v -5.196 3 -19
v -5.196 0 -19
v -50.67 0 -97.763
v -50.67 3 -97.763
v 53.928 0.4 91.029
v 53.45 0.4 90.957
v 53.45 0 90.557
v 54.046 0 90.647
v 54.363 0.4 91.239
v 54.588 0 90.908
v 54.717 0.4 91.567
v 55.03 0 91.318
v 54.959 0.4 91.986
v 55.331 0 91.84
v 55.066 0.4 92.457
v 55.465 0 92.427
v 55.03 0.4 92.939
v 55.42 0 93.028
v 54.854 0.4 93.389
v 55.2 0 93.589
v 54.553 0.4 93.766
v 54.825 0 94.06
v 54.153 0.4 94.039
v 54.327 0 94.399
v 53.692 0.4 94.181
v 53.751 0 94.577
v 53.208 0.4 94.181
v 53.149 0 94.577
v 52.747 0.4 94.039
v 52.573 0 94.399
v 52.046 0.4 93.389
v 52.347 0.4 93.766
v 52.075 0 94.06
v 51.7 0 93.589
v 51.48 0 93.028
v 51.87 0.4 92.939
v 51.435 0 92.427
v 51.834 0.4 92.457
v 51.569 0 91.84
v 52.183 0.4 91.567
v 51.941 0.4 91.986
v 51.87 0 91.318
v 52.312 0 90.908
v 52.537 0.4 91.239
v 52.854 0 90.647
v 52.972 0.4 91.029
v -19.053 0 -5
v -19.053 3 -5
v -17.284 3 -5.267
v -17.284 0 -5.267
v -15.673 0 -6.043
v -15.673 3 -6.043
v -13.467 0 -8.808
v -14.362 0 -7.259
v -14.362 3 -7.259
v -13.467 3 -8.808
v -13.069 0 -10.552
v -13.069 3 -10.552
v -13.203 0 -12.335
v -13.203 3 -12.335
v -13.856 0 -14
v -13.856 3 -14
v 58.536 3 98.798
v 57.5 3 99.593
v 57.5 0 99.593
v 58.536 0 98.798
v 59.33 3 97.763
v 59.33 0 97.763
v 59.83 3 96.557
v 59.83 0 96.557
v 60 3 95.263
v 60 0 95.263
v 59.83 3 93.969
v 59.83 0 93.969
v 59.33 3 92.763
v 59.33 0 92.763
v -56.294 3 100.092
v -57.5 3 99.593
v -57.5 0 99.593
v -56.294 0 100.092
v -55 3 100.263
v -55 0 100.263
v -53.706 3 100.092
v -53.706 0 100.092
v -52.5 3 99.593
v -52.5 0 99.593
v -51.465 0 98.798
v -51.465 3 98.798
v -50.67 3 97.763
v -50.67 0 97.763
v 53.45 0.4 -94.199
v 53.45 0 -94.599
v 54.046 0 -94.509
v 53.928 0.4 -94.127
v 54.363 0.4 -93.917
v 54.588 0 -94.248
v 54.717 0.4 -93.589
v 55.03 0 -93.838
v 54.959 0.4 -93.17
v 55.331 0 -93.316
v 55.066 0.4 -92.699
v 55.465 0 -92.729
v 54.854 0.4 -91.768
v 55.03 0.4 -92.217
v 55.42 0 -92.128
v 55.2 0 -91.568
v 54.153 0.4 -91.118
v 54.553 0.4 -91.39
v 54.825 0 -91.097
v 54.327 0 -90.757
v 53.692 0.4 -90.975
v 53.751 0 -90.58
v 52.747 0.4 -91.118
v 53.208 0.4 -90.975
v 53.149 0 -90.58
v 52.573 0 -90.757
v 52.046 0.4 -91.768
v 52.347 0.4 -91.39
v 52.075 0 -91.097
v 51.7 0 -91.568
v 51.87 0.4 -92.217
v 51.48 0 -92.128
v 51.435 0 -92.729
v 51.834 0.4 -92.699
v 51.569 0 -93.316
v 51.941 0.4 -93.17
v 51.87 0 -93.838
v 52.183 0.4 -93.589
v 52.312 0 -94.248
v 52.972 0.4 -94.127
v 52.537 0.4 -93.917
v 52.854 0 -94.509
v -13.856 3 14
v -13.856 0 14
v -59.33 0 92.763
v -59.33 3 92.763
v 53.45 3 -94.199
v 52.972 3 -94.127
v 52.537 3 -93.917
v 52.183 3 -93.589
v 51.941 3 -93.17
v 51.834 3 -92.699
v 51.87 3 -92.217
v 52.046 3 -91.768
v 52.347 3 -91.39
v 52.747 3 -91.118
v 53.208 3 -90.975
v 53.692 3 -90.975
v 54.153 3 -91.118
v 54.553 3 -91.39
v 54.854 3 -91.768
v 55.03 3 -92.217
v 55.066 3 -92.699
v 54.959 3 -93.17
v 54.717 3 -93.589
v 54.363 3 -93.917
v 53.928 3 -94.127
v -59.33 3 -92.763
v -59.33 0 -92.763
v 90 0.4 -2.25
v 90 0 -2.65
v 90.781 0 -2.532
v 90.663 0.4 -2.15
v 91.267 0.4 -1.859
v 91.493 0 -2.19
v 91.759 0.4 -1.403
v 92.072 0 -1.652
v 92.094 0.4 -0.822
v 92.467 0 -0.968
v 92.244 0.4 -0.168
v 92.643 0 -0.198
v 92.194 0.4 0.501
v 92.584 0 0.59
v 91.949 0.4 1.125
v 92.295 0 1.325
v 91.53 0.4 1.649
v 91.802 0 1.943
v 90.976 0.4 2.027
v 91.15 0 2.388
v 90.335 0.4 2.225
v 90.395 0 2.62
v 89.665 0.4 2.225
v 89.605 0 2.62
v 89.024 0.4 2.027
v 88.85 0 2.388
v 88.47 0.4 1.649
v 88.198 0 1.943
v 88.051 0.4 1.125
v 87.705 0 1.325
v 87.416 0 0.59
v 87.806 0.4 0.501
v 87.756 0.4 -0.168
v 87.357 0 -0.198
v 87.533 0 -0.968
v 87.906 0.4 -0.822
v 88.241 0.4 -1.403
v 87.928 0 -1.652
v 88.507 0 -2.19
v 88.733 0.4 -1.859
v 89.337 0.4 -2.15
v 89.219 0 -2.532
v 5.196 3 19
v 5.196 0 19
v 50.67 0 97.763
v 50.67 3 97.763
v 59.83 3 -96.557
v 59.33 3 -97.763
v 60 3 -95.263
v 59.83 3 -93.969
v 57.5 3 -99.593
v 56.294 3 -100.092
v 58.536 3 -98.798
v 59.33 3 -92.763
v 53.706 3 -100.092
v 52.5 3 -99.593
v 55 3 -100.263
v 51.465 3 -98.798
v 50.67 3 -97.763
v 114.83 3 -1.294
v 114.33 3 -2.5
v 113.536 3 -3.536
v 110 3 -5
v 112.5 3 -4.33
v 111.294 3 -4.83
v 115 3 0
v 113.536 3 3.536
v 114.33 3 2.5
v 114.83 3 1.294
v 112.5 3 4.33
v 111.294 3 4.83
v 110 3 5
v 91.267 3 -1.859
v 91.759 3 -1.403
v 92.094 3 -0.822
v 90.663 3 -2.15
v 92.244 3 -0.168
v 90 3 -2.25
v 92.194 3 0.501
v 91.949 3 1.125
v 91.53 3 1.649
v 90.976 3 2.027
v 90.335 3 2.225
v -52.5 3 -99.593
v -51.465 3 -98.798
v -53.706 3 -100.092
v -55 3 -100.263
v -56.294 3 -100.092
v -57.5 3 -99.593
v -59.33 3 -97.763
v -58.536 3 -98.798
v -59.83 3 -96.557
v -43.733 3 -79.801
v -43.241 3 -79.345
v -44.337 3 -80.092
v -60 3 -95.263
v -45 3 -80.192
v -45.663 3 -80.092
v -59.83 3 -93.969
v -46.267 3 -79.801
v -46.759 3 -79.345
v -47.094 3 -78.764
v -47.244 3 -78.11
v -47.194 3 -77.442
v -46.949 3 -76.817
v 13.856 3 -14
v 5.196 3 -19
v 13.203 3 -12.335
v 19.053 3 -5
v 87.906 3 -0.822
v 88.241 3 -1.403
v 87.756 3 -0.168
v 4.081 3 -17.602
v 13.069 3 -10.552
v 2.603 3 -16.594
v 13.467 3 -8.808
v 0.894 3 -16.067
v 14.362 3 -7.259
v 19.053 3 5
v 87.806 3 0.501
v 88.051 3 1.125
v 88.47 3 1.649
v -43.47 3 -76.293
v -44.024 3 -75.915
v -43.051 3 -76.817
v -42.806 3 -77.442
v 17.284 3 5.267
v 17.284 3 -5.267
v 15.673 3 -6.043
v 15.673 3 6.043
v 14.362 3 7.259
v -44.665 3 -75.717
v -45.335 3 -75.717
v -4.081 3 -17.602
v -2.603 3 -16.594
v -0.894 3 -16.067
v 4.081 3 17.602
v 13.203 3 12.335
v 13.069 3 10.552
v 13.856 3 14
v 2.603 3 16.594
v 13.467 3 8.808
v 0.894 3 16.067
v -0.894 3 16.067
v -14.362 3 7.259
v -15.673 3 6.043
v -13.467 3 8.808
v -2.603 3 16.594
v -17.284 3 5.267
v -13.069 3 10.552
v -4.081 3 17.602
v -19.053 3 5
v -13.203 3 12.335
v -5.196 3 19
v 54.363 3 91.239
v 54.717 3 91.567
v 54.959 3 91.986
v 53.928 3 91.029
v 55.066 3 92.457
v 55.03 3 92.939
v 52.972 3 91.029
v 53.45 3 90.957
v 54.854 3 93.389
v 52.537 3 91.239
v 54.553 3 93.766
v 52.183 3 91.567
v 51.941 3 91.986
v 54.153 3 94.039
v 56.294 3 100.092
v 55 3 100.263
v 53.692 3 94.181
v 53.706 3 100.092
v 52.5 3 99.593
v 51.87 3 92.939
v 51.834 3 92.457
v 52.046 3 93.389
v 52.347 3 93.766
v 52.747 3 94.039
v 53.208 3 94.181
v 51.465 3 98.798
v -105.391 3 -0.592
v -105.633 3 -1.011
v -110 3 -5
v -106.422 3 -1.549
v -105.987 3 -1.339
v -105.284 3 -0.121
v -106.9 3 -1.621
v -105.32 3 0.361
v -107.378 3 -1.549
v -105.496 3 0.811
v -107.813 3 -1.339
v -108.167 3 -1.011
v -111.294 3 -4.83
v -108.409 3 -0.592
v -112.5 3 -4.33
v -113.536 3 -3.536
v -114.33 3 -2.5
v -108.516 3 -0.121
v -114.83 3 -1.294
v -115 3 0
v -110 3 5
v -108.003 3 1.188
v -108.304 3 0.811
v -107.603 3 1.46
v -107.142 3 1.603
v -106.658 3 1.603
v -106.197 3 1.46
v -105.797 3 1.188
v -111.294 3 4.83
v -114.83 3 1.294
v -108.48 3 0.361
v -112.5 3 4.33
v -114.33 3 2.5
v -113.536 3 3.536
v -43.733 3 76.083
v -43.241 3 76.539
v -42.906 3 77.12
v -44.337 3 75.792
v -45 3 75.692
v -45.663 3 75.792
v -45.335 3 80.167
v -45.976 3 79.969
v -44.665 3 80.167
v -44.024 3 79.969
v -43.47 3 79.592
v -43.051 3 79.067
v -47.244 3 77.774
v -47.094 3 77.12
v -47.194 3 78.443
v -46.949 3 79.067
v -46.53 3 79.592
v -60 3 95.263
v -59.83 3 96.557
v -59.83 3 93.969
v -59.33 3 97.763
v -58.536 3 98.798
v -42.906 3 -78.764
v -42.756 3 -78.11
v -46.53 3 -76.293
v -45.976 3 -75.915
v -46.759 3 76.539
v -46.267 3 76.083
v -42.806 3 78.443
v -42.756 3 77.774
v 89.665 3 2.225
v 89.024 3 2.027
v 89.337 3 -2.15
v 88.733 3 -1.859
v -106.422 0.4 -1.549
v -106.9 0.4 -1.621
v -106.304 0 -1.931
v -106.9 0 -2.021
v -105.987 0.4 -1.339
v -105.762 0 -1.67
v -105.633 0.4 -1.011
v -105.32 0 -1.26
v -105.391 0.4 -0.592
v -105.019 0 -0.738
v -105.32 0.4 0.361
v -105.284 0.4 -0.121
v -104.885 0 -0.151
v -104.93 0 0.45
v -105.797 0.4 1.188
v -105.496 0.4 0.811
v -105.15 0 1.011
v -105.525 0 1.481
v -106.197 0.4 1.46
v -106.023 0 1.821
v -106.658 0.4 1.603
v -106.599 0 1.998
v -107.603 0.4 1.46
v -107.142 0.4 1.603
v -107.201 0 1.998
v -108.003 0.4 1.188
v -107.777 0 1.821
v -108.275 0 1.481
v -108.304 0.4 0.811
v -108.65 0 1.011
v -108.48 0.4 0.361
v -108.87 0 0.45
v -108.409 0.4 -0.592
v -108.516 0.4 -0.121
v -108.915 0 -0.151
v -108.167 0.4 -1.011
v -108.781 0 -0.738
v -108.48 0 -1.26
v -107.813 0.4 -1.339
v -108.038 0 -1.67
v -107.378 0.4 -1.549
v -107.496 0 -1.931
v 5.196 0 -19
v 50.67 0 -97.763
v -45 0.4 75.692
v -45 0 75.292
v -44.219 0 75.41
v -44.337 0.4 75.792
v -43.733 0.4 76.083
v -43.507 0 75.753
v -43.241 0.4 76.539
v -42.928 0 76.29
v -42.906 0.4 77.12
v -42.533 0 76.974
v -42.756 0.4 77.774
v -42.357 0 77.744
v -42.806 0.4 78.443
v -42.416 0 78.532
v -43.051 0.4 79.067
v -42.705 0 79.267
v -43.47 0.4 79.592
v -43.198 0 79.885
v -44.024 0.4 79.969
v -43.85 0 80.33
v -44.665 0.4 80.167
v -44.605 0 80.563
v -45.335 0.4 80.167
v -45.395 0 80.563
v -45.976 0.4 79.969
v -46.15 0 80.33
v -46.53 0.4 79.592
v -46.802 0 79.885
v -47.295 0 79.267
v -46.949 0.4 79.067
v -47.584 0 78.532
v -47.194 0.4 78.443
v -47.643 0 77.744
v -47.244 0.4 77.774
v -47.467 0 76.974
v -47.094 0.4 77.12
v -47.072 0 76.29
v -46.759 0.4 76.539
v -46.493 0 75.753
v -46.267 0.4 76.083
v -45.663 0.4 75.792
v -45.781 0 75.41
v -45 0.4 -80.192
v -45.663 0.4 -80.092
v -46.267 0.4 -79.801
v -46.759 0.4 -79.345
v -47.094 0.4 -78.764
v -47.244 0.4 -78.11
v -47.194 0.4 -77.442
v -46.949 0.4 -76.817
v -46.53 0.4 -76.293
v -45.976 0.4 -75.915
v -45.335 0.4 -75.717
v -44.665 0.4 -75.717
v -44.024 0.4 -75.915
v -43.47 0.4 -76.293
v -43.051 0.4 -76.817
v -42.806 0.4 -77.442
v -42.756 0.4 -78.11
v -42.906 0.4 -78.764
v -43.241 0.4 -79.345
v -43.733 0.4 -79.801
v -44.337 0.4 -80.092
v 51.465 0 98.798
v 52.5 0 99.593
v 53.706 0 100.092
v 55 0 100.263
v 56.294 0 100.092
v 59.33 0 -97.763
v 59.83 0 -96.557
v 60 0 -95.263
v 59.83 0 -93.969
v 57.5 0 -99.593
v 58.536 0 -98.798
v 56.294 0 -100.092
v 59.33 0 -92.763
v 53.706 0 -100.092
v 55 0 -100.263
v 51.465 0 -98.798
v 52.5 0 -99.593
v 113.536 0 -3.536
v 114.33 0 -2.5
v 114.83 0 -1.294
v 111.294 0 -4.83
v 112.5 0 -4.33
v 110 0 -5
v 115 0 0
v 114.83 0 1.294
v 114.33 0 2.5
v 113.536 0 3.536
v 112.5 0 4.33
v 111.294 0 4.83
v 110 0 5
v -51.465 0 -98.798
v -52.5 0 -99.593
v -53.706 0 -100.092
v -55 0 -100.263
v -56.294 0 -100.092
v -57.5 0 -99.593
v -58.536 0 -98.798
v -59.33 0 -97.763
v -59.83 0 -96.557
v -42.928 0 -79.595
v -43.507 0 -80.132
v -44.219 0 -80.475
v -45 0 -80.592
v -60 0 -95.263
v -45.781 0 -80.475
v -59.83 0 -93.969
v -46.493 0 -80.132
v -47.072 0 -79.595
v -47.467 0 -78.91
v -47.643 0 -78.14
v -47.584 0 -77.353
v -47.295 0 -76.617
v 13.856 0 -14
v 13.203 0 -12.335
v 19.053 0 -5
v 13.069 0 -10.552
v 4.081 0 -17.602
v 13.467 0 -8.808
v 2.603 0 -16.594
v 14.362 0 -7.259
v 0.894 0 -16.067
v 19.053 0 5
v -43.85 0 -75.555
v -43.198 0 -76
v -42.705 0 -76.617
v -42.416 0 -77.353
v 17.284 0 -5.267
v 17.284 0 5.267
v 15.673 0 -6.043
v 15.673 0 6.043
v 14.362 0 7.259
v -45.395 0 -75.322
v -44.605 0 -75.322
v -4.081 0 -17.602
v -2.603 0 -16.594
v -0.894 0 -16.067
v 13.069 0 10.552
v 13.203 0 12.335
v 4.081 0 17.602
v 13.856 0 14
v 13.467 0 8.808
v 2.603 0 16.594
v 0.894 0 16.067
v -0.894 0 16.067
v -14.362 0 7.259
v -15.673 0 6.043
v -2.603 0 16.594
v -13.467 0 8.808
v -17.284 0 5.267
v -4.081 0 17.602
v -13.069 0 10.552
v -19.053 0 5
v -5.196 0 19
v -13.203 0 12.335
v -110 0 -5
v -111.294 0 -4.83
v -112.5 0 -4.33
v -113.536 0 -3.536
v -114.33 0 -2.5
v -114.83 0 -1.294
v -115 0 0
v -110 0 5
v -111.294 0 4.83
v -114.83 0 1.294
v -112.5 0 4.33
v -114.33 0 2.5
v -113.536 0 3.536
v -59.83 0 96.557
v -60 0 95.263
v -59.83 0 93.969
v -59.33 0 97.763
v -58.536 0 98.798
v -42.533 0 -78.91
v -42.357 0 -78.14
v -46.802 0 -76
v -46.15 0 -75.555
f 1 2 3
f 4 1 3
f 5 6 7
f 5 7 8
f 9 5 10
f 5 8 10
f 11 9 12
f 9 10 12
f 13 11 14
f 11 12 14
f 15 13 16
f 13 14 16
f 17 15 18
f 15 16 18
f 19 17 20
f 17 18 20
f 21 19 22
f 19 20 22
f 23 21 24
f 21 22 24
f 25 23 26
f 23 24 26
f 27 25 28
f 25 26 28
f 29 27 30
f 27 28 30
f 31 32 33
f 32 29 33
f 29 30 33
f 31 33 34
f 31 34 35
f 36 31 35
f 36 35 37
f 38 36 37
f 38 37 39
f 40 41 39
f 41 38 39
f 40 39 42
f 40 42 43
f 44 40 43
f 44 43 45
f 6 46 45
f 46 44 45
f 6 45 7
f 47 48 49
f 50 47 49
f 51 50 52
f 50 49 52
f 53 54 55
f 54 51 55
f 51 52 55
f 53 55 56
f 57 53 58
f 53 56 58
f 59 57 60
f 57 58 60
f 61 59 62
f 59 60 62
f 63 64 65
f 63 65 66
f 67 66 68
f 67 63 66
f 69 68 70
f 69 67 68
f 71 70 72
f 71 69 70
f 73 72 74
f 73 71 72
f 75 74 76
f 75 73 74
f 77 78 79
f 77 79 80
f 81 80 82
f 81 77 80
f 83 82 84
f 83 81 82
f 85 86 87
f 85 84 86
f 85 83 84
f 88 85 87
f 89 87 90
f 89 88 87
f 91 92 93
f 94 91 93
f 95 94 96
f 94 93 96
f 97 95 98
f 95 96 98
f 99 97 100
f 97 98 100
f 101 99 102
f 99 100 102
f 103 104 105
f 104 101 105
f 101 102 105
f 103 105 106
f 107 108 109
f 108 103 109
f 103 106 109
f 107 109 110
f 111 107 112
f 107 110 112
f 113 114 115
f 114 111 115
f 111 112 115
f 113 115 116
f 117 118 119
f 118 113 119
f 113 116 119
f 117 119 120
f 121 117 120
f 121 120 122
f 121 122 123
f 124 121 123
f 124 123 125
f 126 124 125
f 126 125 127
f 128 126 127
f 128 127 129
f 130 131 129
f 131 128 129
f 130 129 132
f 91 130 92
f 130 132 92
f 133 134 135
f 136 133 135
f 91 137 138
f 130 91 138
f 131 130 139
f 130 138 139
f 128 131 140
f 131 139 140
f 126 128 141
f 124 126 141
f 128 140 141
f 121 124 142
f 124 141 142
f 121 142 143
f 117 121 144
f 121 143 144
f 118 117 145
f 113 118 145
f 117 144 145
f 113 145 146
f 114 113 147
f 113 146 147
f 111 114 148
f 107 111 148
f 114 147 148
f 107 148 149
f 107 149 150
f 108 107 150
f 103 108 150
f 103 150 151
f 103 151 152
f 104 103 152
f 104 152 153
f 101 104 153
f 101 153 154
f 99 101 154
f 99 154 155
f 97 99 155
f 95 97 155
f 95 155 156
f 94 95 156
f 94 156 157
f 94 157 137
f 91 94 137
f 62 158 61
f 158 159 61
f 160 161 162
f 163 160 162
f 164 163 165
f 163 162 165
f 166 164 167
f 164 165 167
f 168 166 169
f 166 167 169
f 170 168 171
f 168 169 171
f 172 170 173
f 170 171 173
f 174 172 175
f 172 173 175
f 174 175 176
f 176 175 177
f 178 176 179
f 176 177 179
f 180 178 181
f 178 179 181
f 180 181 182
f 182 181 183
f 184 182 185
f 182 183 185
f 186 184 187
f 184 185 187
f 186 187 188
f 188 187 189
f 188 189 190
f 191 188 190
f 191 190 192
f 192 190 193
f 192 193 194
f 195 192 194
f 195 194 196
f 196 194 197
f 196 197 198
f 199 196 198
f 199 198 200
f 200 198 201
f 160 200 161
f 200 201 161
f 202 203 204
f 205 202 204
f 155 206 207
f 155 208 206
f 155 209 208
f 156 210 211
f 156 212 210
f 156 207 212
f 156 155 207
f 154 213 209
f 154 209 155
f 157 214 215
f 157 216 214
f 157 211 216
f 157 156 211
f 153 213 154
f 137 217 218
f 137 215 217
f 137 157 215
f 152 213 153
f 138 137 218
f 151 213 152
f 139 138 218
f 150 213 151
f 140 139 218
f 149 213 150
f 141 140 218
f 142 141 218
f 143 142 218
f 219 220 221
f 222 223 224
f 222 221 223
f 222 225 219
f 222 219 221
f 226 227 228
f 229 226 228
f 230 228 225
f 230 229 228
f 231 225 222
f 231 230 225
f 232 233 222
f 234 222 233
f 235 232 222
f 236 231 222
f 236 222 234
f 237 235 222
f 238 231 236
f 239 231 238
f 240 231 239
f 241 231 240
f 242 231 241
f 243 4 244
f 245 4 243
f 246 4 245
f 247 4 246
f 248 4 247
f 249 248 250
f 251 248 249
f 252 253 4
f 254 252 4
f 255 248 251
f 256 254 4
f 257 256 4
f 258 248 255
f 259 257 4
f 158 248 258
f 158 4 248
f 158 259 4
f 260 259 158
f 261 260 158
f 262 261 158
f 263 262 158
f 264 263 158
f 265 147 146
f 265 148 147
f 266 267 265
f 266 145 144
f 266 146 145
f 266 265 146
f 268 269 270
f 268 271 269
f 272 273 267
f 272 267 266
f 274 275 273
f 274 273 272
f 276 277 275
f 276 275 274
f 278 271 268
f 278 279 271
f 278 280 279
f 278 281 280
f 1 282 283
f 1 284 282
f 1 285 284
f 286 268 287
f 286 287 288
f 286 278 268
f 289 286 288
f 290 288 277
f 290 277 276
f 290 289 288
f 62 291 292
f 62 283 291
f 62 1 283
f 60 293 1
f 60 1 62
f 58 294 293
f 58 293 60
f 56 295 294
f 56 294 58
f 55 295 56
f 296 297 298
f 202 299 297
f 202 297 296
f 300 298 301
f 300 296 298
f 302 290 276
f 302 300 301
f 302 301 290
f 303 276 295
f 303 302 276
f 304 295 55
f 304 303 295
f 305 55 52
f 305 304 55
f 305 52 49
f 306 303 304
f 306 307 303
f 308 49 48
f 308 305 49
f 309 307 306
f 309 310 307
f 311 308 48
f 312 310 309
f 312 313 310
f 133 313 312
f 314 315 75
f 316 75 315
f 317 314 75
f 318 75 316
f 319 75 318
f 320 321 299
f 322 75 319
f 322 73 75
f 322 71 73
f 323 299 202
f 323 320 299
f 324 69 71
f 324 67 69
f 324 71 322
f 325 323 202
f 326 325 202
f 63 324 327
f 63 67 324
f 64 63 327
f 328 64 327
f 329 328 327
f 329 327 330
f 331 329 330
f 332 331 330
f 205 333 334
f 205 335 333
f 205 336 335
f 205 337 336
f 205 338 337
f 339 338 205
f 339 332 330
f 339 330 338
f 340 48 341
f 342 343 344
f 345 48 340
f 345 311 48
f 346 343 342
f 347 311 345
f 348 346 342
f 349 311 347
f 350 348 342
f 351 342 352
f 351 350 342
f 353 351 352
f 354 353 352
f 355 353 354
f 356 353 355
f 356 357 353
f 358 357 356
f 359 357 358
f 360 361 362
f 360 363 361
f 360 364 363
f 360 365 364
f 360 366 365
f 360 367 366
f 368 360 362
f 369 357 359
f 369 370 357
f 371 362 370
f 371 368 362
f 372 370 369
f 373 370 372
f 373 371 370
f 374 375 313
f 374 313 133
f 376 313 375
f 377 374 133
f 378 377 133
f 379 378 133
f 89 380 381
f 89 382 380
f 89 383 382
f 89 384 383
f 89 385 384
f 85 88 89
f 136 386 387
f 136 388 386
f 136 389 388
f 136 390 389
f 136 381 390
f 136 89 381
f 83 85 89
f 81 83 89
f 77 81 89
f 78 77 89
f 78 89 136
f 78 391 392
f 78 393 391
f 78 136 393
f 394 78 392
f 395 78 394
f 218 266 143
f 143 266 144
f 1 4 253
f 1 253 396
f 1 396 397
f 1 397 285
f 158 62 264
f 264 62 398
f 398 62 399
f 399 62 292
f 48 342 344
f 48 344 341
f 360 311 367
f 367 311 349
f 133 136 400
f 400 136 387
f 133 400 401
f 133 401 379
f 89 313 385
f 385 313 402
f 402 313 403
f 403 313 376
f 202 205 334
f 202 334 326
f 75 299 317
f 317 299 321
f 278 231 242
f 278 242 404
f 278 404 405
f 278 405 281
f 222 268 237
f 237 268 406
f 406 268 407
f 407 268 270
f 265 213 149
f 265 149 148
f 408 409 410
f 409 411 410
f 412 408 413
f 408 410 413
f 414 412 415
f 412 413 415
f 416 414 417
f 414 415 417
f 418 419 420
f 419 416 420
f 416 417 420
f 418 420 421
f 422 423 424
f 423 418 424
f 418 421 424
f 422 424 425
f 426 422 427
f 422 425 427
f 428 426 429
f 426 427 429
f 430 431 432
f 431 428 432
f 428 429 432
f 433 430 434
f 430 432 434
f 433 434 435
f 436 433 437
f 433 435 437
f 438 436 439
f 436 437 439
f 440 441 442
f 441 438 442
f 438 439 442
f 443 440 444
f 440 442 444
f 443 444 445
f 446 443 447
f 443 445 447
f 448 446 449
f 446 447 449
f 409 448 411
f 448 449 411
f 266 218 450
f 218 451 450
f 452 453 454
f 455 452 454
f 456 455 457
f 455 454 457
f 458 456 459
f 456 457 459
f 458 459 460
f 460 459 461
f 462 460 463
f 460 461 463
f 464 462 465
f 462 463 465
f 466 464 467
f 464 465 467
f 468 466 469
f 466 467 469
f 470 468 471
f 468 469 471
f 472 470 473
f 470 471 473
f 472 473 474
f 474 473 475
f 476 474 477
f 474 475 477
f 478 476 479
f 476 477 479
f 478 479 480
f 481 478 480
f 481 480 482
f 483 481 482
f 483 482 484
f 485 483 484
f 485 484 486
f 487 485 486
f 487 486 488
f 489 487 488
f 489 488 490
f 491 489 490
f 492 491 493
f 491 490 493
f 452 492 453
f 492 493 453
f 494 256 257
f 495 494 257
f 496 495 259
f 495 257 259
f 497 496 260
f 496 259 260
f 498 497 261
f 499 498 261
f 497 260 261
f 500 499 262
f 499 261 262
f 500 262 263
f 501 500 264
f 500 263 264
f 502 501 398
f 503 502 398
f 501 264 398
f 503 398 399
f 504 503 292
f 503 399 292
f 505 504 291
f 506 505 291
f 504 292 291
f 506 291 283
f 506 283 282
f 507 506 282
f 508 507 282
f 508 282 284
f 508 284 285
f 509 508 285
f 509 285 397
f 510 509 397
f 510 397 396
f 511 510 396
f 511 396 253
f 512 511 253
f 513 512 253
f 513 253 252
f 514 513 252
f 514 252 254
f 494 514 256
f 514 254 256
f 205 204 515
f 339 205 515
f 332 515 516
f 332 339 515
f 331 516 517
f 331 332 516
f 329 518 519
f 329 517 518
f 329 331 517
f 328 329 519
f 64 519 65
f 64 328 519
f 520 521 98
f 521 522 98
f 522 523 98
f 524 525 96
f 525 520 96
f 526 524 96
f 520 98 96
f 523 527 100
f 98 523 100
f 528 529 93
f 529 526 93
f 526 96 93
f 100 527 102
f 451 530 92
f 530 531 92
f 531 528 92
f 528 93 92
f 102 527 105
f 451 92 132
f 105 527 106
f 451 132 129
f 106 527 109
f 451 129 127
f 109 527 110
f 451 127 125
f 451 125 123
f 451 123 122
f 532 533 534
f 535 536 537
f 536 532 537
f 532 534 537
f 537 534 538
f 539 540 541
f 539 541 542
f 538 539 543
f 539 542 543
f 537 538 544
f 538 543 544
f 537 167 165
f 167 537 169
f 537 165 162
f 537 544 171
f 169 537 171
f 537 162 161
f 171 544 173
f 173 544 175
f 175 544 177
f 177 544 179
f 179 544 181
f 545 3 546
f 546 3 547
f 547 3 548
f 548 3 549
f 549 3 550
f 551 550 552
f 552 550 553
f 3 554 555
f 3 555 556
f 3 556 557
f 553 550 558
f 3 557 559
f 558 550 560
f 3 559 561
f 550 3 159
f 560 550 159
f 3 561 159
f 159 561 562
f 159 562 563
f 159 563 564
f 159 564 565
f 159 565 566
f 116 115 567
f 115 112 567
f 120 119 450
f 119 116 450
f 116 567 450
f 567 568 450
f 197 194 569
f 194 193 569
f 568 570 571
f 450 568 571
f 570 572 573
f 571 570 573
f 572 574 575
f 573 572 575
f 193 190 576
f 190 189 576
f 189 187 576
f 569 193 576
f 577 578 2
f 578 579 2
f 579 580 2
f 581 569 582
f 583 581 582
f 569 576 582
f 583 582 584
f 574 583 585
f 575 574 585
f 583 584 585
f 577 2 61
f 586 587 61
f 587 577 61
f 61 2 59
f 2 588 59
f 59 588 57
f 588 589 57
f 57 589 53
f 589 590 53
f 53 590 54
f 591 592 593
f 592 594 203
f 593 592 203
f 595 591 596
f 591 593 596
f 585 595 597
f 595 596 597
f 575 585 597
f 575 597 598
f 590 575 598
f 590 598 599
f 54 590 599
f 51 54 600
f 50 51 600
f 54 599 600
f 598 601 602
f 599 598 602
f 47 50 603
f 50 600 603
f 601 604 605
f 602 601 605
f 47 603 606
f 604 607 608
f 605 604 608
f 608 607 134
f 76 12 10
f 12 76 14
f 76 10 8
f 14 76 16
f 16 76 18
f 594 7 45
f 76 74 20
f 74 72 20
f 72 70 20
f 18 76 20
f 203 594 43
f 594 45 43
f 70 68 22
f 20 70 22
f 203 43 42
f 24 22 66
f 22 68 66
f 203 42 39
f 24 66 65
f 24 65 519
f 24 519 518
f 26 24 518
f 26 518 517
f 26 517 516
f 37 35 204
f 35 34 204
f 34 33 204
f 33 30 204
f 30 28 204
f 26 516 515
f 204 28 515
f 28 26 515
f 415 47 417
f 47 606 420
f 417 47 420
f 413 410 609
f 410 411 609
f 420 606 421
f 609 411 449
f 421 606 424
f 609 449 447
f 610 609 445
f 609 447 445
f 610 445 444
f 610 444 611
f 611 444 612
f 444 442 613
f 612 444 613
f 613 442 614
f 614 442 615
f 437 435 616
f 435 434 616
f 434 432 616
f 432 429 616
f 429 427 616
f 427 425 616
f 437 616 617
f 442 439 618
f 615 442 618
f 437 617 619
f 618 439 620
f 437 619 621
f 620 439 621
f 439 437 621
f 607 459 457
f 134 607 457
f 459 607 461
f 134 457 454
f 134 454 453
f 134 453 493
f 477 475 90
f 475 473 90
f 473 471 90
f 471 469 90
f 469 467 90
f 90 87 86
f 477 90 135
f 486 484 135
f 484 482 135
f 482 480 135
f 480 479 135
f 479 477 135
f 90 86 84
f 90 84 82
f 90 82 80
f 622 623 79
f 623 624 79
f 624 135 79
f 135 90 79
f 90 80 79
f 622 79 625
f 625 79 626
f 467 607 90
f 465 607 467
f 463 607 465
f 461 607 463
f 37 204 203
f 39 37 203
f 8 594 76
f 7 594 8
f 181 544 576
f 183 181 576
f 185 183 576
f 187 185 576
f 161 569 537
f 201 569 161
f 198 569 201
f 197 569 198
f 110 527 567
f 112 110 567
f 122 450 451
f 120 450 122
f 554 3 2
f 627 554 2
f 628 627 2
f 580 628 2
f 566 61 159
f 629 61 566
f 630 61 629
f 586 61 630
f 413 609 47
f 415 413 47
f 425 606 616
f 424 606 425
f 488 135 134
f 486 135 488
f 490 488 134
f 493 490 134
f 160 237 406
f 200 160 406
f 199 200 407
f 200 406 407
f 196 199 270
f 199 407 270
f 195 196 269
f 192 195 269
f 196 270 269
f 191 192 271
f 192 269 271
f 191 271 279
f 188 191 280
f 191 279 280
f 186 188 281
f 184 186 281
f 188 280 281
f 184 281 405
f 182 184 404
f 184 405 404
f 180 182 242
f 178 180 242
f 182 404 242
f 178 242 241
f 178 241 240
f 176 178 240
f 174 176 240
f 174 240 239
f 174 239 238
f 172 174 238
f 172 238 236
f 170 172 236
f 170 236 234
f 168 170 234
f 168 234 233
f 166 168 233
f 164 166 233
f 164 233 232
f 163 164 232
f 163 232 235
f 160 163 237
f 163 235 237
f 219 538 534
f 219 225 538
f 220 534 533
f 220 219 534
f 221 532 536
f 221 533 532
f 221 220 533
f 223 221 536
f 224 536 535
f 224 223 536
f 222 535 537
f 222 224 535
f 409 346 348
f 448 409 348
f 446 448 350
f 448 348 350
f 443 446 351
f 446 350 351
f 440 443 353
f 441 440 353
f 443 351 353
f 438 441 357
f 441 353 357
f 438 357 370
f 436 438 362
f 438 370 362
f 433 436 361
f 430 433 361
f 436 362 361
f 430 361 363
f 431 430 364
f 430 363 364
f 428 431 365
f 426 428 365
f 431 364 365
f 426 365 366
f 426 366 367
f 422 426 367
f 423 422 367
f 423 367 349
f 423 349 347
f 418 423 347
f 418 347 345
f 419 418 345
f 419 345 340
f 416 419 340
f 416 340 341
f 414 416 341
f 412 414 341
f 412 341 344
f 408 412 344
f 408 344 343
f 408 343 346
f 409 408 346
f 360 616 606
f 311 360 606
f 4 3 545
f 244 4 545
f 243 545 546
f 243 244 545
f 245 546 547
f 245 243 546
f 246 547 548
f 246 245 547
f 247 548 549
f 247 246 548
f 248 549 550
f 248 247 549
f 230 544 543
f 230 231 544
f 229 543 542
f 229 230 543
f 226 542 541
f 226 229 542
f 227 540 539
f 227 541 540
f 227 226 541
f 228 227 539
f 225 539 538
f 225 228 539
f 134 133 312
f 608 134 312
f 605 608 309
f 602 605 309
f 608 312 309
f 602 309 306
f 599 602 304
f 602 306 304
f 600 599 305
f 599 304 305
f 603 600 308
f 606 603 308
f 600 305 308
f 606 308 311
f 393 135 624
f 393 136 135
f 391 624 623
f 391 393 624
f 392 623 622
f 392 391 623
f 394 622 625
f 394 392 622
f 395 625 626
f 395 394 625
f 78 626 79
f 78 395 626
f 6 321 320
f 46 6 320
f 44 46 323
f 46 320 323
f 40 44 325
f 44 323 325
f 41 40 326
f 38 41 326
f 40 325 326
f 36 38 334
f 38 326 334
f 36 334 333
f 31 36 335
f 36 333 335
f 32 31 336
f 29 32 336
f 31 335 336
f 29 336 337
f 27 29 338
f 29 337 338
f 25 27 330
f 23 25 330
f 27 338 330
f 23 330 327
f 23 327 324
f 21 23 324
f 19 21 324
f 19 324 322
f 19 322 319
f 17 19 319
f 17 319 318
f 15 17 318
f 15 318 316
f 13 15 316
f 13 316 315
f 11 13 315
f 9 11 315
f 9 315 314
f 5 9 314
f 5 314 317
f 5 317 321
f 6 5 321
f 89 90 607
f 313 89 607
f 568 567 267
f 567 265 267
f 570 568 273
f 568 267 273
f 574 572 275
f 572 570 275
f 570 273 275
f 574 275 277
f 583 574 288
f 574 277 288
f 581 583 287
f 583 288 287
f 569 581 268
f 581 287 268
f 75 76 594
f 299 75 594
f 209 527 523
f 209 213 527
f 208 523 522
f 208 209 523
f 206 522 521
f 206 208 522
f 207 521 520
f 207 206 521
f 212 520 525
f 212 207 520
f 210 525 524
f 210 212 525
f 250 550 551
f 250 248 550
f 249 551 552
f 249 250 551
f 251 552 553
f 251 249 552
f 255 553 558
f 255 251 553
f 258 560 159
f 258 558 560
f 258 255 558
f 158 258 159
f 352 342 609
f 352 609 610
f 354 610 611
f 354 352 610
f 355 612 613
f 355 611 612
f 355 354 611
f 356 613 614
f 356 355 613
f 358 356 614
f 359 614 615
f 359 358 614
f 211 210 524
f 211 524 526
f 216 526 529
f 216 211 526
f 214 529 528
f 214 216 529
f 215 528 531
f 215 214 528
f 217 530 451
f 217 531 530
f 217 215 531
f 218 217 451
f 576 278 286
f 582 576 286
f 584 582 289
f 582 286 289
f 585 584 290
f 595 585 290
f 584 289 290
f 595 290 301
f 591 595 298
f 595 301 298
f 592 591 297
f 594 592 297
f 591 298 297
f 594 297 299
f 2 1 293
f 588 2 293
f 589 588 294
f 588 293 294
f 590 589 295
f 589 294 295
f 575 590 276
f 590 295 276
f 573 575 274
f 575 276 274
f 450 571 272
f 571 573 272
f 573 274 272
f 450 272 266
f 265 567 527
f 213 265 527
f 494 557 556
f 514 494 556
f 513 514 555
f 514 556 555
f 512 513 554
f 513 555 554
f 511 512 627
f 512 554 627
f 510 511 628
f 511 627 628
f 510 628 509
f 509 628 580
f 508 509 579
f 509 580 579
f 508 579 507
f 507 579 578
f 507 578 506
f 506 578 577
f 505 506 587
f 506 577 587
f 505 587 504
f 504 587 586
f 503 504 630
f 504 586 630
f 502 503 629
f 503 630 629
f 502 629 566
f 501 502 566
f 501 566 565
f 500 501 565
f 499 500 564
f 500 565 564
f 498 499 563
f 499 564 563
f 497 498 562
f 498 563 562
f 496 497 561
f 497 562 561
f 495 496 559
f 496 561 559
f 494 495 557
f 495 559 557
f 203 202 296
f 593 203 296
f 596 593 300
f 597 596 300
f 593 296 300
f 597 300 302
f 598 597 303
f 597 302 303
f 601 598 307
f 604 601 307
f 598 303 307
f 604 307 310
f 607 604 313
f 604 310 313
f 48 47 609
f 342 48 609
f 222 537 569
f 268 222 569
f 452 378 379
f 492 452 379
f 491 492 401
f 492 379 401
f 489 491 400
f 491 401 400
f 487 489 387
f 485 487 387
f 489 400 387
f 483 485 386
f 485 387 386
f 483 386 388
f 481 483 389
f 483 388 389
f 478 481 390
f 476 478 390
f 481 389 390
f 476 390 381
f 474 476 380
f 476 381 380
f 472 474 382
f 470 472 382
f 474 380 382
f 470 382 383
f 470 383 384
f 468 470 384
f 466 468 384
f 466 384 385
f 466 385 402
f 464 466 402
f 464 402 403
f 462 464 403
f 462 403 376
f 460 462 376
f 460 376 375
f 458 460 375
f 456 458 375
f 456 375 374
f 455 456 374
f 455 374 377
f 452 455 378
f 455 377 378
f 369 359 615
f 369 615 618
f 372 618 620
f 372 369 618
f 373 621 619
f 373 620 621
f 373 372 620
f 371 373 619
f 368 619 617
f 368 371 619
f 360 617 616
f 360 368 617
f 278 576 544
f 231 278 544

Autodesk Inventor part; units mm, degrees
ref_plane "YZ Plane" through (0, 0, 0) normal (1, 0, 0) x (0, 1, 0)
ref_plane "XZ Plane" through (0, 0, 0) normal (0, 1, 0) x (-1, 0, 0)
ref_plane "XY Plane" through (0, 0, 0) normal (0, 0, 1) x (1, 0, 0)
sketch "Szkic1" plane through (0, 0, 0) normal (0, 1, 0) x (-1, 0, 0)
  line L0 (-115, -5) -> (115, -5)
  line L1 (115, -5) -> (115, 5)
  line L2 (115, 5) -> (-115, 5)
  line L3 (-115, 5) -> (-115, -5)
  line L4 (-53.1699, -102.0929) -> (61.8301, 97.0929)
  line L5 (53.1699, 102.0929) -> (-61.8301, -97.0929)
  line L6 (-61.8301, -97.0929) -> (-53.1699, -102.0929)
  line L7 (61.8301, 97.0929) -> (53.1699, 102.0929)
  line L8 (61.8301, -97.0929) -> (-53.1699, 102.0929)
  line L9 (-61.8301, 97.0929) -> (53.1699, -102.0929)
  line L10 (53.1699, -102.0929) -> (61.8301, -97.0929)
  line L11 (-53.1699, 102.0929) -> (-61.8301, 97.0929)
  line L12 (115, 5) -> (-115, 5)
  line L13 (-115, -5) -> (115, -5)
  line L14 (115, -5) -> (115, 5)
  line L15 (-115, 5) -> (-115, -5)
  line L16 (53.1699, 102.0929) -> (-61.8301, -97.0929)
  line L17 (-53.1699, -102.0929) -> (61.8301, 97.0929)
  line L18 (61.8301, 97.0929) -> (53.1699, 102.0929)
  line L19 (-61.8301, -97.0929) -> (-53.1699, -102.0929)
  line L20 (-61.8301, 97.0929) -> (53.1699, -102.0929)
  line L21 (61.8301, -97.0929) -> (-53.1699, 102.0929)
  line L22 (-53.1699, 102.0929) -> (-61.8301, 97.0929)
  line L23 (53.1699, -102.0929) -> (61.8301, -97.0929)
  point P0 (0, 0)
  dimension "d6" = 10
  dimension "d7" = 5
  dimension "d8" = 230
  dimension "d9" = 115
  dimension "d12" = 360
extrude "Wyciągnięcie proste2" add sketch "Szkic1" along normal blind 3
sketch "Szkic2" plane through (0, 0, 0) normal (0, -1, 0) x (1, 0, 0)
  line L0 (-53.1699, 102.0929) -> (0, 10) projected
  line L1 (-61.8301, 97.0929) -> (-53.1699, 102.0929) projected
  point P0 (0, 0)
  point P1 (-45, 77.9423)
  point P2 (-45, -77.9423)
  point P3 (90, 0)
  dimension "d48" = 360
fillet "Zaokrąglenie3" radius 6 6 edges at (8.6603, 1.5, 5) (0, 1.5, 10) (-8.6603, 1.5, 5) (-8.6603, 1.5, -5) (0, 1.5, -10) (8.6603, 1.5, -5)
fillet "Zaokrąglenie4" radius 5 2 edges at (-53.1699, 1.5, 102.0929) (-61.8301, 1.5, 97.0929)
sketch "Szkic3" plane through (0, 0, 0) normal (0, -1, 0) x (1, 0, 0)
  point P0 (0, 0)
  point P1 (0, 0)
pattern_circular "Szyk kołowy1" count 6 over 360 about axis through (0, 0, 0) along (0, -1, 0) of "Zaokrąglenie4"
hole "Otwór1" at (-45, 0, 77.9423) at (-45, 0, -77.9423) at (90, 0, 0) direction (0, 1, 0) diameter 4.5 end through all clearance for "Śruba ze łbem stożkowym ISO 2009/7046" size "M4" standard "ISO"
sketch "Szkic4" plane through (0, 0, 0) normal (0, -1, 0) x (1, 0, 0)
  circle A0 centre (0, 0) radius 106.9
  line L0 (0, 0) -> (-125.8998, 0)
  point P0 (-106.9, 0)
  point P1 (53.45, -92.5781)
  point P2 (53.45, 92.5781)
  dimension "d57" = 213.8
  dimension "d60" = 360
hole "Otwór2" at (-106.9, 0, 0) at (53.45, 0, -92.5781) at (53.45, 0, 92.5781) direction (0, 1, 0) diameter 3.242 end through all thread size "M4x0.7" class "6H" standard "ISO Metric profile"
chamfer "Faza1" distance 0.4 angle 45 6 edges at (53.45, 0, -90.9571) (90, 0, 2.25) (-45, 0, -75.6923) (-106.9, 0, 1.621) (-45, 0, 80.1923) (53.45, 0, 94.1991)
properties part number "SpiderPrimaryMirror" material "Aluminium 6061"
